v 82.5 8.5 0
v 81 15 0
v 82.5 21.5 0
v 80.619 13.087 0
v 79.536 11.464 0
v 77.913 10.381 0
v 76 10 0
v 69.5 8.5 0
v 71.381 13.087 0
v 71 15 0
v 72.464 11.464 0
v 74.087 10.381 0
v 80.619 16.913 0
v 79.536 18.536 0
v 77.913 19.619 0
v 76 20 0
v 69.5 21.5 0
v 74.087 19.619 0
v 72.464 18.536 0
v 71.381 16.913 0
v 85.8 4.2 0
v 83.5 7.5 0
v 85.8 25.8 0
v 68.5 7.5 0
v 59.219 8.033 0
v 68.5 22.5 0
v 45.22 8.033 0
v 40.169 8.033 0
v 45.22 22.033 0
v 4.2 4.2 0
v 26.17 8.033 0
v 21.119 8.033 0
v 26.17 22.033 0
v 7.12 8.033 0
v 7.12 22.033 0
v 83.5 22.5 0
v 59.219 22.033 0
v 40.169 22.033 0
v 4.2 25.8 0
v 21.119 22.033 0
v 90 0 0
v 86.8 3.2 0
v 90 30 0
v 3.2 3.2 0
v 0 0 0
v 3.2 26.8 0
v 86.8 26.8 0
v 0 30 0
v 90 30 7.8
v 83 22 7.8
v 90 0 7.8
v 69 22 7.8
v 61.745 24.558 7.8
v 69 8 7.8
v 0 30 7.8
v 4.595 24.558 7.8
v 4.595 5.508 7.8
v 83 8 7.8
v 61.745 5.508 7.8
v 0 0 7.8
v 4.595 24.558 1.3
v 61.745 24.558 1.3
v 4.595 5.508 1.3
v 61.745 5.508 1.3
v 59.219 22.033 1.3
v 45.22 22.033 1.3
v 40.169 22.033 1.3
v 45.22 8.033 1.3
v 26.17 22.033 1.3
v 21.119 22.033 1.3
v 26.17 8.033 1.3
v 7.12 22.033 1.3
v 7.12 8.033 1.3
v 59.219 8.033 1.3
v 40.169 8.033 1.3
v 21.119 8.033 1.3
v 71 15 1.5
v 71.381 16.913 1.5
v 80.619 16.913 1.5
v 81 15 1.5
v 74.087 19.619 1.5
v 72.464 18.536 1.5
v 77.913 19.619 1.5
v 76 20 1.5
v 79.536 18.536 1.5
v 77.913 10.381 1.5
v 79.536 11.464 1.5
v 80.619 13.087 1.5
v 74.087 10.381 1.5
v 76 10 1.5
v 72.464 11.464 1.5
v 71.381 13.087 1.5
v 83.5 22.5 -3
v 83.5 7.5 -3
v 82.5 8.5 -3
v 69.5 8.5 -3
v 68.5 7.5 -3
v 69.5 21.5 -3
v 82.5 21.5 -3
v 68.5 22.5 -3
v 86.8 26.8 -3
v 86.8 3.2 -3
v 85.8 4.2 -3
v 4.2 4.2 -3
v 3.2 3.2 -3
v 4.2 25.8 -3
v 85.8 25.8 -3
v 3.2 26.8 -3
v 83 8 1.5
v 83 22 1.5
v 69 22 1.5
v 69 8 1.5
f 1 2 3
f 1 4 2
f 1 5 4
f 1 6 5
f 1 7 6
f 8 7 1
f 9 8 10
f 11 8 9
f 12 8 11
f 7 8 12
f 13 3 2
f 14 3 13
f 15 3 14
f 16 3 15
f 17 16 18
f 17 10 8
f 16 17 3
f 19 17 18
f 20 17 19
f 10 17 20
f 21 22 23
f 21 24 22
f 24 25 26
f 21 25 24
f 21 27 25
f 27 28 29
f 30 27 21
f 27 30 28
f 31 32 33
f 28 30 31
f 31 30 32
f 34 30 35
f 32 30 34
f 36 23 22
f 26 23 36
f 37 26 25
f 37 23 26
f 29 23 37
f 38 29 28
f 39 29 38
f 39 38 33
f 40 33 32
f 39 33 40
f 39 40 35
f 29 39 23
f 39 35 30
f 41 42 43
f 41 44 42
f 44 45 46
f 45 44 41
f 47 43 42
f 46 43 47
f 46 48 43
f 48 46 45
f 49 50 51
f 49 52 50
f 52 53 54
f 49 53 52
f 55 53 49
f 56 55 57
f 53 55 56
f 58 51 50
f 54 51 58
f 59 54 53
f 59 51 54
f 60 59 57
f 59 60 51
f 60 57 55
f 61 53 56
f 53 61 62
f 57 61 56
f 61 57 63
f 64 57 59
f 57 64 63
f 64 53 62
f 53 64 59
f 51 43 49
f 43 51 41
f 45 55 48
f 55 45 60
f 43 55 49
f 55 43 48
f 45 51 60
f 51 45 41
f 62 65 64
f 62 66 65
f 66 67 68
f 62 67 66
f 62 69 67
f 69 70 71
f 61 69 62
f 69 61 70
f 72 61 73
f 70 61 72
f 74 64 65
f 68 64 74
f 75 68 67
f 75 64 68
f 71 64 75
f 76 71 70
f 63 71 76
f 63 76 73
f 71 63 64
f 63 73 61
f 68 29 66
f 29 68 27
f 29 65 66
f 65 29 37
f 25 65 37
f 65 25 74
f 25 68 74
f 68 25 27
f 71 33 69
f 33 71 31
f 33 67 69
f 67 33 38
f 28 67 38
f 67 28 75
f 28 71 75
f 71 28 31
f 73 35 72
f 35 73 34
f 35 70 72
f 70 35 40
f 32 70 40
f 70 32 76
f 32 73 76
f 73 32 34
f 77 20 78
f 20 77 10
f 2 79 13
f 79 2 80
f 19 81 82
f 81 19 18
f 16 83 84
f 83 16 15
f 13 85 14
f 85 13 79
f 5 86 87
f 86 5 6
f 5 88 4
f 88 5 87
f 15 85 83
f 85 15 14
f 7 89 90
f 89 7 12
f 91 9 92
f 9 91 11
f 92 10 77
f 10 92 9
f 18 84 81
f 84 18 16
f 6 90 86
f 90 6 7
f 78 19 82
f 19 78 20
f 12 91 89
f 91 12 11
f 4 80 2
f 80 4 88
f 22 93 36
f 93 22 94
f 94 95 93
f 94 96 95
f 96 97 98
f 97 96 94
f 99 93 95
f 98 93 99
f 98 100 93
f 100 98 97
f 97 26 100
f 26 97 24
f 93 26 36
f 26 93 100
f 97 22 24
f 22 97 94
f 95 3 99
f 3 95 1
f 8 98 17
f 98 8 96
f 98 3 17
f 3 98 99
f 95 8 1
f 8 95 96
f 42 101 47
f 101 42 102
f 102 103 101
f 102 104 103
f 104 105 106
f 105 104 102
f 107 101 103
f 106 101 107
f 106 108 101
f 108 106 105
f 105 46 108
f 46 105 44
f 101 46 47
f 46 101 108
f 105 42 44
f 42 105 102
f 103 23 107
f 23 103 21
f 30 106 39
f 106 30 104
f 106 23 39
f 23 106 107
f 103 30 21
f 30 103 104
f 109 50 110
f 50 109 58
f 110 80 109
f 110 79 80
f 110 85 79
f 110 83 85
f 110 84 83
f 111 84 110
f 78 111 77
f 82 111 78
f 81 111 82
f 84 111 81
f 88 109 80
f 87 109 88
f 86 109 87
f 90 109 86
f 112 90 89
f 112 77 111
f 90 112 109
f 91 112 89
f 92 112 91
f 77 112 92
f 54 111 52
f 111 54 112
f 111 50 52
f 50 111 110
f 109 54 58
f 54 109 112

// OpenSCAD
BODY_DEPTH = 3;
SWITCH_DEPTH = 6.5;
PLATE_DEPTH = 1.3;
FRONT_DEPTH = SWITCH_DEPTH + PLATE_DEPTH;
SWITCH_POSITION = [4.5, 5.25, 0];
ENCODER_POSITION = [76, 15, 0];
ENCODER_BODY_SIZE = 13; // Actual size is 12mm, but it was too tight a fit so added some clearence

// Front
difference() {
    union() {
        difference() {
            union() {
                difference() {
                    cube(size = [90, 30, FRONT_DEPTH]);
                    
                    union() {
                        linear_extrude(height = FRONT_DEPTH)
                            translate(SWITCH_POSITION)
                            import(file = "keyspacing.dxf");
                        translate([4.75, 7, 0])
                            cube(size = [55, 16, FRONT_DEPTH]);
                    }
                }

                linear_extrude(height = PLATE_DEPTH)
                            translate(SWITCH_POSITION)
                            import(file = "keyspacing.dxf");
            }
            translate(ENCODER_POSITION)
                cylinder(10, 5, 5);
        }

        // Encoder holder
        translate([ENCODER_POSITION[0], ENCODER_POSITION[1], -1.5])
            difference() {
                cube(size = [ENCODER_BODY_SIZE + 2, ENCODER_BODY_SIZE + 2, 3], center = true);
                cube(size = [ENCODER_BODY_SIZE, ENCODER_BODY_SIZE, 3], center = true);
            }
            
        // Catch (For glueing in place to body)
        CATCH_OFFSET = BODY_DEPTH + 0.2;      
        translate([CATCH_OFFSET, CATCH_OFFSET, -3])
            difference() {
                cube(size = [90 - (CATCH_OFFSET * 2), 30 - (CATCH_OFFSET * 2), 3]);
                translate([1, 1, 0])
                    cube(size = [88 - (CATCH_OFFSET * 2), 28 - (CATCH_OFFSET * 2), 3]);
            }
    }
    // Mutepad text
    // translate([4.5, 2, FRONT_DEPTH - 3])
        // linear_extrude(20)
        // text("MutePad", size = 2.5, font = "tahoma:style=bold");
    translate([ENCODER_POSITION[0], ENCODER_POSITION[1], 5.5])
        cube(size = [ENCODER_BODY_SIZE + 1, ENCODER_BODY_SIZE + 1, 8], center = true);
}
